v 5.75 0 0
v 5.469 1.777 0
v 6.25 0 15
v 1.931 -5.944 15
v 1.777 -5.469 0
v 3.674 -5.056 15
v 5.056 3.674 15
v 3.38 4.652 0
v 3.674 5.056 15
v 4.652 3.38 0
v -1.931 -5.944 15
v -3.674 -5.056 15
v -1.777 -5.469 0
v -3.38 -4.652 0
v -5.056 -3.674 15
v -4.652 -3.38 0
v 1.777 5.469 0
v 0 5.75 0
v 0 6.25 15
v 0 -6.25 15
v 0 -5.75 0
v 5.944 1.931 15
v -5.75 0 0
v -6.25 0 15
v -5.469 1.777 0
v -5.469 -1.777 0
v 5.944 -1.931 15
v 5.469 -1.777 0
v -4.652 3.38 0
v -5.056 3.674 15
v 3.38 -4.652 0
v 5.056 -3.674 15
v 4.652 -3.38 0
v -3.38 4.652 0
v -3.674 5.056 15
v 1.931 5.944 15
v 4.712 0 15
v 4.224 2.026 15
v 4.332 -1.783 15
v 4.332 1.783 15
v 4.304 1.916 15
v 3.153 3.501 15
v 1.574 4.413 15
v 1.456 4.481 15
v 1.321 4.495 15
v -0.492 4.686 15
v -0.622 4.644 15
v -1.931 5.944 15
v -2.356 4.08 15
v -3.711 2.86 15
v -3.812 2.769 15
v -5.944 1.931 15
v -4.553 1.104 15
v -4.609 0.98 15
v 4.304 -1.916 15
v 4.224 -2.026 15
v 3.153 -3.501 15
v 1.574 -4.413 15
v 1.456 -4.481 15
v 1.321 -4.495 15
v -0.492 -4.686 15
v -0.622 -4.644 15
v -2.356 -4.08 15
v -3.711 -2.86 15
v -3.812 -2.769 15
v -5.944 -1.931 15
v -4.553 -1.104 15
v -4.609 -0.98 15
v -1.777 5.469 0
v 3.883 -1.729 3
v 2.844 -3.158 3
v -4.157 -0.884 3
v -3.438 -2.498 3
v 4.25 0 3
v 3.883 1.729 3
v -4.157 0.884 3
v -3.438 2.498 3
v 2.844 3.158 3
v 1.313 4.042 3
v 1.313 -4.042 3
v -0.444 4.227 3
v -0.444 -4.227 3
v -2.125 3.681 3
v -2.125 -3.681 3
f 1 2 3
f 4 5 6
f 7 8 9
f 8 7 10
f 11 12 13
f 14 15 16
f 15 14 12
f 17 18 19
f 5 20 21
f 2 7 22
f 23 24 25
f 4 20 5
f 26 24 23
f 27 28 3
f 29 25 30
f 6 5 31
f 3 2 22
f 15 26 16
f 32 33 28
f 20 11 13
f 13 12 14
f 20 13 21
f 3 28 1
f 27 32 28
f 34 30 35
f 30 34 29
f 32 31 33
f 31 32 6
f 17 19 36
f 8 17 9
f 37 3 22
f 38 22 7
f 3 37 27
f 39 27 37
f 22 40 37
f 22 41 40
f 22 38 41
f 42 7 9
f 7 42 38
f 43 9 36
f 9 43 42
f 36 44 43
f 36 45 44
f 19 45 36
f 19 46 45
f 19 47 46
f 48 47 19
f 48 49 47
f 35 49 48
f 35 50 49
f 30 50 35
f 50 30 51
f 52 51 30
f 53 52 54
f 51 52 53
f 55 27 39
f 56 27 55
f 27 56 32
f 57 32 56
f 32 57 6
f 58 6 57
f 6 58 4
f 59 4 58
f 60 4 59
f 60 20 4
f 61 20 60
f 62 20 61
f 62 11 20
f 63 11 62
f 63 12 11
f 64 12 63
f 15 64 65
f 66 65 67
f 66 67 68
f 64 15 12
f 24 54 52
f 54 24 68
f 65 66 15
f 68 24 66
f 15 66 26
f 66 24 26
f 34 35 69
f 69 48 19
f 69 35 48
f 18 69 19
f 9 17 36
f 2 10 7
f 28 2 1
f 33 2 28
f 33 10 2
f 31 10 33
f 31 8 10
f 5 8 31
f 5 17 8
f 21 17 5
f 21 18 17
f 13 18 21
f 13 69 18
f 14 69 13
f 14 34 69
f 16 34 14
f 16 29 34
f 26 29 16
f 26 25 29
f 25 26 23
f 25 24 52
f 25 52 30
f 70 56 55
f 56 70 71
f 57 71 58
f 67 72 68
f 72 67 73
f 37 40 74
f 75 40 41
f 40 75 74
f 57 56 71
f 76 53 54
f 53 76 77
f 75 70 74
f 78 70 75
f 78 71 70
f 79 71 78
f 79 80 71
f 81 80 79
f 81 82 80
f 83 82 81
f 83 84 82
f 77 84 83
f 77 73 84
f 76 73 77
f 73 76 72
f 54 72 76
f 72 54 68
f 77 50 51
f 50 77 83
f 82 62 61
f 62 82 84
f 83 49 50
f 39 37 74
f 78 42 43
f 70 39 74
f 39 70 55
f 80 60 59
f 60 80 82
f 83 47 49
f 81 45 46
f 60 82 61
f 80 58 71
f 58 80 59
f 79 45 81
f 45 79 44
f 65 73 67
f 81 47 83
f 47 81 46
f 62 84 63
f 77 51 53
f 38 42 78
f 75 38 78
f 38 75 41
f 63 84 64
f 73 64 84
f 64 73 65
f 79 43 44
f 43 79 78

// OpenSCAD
// file: cap.scad
/*
    Simple cap.
    
    Print Notes
        Use a rubbery plastic. The type I have sometimes is dodgy on the first layer.
        Using  brim may help.
*/

module cap( d1, d2, h, thickness )
{
    difference() {
        cylinder( d1=d1+thickness, d2=d2 + thickness, h=h+thickness );
        translate( [0,0,thickness] ) {
            cylinder( d1=d1, d2=d2, h=h+1 );
        }
    }
}
// main file
/*
    A cap for a shot pourer (the things you put on a spirit bottle to make pouring shots easier.
    Search for "Stainless Steel Shot Pourer, on ebay etc.
    This is for the stainless steel type, which have a straight (non-tapered) spout, and a rubber air inlet pipe.
    FYI, the ones with the rubbery air inlet pipe are crap - don't buy them!

    There are similar looking ones with a metal air inlet with a tapered spout.
    See cap-ShotPourer.scad for this kind.
    
    Print Notes
        Print using a rubbery plastic.
*/

use <cap.scad>;

cap( 8.5, 9.5,  12,  3 );
